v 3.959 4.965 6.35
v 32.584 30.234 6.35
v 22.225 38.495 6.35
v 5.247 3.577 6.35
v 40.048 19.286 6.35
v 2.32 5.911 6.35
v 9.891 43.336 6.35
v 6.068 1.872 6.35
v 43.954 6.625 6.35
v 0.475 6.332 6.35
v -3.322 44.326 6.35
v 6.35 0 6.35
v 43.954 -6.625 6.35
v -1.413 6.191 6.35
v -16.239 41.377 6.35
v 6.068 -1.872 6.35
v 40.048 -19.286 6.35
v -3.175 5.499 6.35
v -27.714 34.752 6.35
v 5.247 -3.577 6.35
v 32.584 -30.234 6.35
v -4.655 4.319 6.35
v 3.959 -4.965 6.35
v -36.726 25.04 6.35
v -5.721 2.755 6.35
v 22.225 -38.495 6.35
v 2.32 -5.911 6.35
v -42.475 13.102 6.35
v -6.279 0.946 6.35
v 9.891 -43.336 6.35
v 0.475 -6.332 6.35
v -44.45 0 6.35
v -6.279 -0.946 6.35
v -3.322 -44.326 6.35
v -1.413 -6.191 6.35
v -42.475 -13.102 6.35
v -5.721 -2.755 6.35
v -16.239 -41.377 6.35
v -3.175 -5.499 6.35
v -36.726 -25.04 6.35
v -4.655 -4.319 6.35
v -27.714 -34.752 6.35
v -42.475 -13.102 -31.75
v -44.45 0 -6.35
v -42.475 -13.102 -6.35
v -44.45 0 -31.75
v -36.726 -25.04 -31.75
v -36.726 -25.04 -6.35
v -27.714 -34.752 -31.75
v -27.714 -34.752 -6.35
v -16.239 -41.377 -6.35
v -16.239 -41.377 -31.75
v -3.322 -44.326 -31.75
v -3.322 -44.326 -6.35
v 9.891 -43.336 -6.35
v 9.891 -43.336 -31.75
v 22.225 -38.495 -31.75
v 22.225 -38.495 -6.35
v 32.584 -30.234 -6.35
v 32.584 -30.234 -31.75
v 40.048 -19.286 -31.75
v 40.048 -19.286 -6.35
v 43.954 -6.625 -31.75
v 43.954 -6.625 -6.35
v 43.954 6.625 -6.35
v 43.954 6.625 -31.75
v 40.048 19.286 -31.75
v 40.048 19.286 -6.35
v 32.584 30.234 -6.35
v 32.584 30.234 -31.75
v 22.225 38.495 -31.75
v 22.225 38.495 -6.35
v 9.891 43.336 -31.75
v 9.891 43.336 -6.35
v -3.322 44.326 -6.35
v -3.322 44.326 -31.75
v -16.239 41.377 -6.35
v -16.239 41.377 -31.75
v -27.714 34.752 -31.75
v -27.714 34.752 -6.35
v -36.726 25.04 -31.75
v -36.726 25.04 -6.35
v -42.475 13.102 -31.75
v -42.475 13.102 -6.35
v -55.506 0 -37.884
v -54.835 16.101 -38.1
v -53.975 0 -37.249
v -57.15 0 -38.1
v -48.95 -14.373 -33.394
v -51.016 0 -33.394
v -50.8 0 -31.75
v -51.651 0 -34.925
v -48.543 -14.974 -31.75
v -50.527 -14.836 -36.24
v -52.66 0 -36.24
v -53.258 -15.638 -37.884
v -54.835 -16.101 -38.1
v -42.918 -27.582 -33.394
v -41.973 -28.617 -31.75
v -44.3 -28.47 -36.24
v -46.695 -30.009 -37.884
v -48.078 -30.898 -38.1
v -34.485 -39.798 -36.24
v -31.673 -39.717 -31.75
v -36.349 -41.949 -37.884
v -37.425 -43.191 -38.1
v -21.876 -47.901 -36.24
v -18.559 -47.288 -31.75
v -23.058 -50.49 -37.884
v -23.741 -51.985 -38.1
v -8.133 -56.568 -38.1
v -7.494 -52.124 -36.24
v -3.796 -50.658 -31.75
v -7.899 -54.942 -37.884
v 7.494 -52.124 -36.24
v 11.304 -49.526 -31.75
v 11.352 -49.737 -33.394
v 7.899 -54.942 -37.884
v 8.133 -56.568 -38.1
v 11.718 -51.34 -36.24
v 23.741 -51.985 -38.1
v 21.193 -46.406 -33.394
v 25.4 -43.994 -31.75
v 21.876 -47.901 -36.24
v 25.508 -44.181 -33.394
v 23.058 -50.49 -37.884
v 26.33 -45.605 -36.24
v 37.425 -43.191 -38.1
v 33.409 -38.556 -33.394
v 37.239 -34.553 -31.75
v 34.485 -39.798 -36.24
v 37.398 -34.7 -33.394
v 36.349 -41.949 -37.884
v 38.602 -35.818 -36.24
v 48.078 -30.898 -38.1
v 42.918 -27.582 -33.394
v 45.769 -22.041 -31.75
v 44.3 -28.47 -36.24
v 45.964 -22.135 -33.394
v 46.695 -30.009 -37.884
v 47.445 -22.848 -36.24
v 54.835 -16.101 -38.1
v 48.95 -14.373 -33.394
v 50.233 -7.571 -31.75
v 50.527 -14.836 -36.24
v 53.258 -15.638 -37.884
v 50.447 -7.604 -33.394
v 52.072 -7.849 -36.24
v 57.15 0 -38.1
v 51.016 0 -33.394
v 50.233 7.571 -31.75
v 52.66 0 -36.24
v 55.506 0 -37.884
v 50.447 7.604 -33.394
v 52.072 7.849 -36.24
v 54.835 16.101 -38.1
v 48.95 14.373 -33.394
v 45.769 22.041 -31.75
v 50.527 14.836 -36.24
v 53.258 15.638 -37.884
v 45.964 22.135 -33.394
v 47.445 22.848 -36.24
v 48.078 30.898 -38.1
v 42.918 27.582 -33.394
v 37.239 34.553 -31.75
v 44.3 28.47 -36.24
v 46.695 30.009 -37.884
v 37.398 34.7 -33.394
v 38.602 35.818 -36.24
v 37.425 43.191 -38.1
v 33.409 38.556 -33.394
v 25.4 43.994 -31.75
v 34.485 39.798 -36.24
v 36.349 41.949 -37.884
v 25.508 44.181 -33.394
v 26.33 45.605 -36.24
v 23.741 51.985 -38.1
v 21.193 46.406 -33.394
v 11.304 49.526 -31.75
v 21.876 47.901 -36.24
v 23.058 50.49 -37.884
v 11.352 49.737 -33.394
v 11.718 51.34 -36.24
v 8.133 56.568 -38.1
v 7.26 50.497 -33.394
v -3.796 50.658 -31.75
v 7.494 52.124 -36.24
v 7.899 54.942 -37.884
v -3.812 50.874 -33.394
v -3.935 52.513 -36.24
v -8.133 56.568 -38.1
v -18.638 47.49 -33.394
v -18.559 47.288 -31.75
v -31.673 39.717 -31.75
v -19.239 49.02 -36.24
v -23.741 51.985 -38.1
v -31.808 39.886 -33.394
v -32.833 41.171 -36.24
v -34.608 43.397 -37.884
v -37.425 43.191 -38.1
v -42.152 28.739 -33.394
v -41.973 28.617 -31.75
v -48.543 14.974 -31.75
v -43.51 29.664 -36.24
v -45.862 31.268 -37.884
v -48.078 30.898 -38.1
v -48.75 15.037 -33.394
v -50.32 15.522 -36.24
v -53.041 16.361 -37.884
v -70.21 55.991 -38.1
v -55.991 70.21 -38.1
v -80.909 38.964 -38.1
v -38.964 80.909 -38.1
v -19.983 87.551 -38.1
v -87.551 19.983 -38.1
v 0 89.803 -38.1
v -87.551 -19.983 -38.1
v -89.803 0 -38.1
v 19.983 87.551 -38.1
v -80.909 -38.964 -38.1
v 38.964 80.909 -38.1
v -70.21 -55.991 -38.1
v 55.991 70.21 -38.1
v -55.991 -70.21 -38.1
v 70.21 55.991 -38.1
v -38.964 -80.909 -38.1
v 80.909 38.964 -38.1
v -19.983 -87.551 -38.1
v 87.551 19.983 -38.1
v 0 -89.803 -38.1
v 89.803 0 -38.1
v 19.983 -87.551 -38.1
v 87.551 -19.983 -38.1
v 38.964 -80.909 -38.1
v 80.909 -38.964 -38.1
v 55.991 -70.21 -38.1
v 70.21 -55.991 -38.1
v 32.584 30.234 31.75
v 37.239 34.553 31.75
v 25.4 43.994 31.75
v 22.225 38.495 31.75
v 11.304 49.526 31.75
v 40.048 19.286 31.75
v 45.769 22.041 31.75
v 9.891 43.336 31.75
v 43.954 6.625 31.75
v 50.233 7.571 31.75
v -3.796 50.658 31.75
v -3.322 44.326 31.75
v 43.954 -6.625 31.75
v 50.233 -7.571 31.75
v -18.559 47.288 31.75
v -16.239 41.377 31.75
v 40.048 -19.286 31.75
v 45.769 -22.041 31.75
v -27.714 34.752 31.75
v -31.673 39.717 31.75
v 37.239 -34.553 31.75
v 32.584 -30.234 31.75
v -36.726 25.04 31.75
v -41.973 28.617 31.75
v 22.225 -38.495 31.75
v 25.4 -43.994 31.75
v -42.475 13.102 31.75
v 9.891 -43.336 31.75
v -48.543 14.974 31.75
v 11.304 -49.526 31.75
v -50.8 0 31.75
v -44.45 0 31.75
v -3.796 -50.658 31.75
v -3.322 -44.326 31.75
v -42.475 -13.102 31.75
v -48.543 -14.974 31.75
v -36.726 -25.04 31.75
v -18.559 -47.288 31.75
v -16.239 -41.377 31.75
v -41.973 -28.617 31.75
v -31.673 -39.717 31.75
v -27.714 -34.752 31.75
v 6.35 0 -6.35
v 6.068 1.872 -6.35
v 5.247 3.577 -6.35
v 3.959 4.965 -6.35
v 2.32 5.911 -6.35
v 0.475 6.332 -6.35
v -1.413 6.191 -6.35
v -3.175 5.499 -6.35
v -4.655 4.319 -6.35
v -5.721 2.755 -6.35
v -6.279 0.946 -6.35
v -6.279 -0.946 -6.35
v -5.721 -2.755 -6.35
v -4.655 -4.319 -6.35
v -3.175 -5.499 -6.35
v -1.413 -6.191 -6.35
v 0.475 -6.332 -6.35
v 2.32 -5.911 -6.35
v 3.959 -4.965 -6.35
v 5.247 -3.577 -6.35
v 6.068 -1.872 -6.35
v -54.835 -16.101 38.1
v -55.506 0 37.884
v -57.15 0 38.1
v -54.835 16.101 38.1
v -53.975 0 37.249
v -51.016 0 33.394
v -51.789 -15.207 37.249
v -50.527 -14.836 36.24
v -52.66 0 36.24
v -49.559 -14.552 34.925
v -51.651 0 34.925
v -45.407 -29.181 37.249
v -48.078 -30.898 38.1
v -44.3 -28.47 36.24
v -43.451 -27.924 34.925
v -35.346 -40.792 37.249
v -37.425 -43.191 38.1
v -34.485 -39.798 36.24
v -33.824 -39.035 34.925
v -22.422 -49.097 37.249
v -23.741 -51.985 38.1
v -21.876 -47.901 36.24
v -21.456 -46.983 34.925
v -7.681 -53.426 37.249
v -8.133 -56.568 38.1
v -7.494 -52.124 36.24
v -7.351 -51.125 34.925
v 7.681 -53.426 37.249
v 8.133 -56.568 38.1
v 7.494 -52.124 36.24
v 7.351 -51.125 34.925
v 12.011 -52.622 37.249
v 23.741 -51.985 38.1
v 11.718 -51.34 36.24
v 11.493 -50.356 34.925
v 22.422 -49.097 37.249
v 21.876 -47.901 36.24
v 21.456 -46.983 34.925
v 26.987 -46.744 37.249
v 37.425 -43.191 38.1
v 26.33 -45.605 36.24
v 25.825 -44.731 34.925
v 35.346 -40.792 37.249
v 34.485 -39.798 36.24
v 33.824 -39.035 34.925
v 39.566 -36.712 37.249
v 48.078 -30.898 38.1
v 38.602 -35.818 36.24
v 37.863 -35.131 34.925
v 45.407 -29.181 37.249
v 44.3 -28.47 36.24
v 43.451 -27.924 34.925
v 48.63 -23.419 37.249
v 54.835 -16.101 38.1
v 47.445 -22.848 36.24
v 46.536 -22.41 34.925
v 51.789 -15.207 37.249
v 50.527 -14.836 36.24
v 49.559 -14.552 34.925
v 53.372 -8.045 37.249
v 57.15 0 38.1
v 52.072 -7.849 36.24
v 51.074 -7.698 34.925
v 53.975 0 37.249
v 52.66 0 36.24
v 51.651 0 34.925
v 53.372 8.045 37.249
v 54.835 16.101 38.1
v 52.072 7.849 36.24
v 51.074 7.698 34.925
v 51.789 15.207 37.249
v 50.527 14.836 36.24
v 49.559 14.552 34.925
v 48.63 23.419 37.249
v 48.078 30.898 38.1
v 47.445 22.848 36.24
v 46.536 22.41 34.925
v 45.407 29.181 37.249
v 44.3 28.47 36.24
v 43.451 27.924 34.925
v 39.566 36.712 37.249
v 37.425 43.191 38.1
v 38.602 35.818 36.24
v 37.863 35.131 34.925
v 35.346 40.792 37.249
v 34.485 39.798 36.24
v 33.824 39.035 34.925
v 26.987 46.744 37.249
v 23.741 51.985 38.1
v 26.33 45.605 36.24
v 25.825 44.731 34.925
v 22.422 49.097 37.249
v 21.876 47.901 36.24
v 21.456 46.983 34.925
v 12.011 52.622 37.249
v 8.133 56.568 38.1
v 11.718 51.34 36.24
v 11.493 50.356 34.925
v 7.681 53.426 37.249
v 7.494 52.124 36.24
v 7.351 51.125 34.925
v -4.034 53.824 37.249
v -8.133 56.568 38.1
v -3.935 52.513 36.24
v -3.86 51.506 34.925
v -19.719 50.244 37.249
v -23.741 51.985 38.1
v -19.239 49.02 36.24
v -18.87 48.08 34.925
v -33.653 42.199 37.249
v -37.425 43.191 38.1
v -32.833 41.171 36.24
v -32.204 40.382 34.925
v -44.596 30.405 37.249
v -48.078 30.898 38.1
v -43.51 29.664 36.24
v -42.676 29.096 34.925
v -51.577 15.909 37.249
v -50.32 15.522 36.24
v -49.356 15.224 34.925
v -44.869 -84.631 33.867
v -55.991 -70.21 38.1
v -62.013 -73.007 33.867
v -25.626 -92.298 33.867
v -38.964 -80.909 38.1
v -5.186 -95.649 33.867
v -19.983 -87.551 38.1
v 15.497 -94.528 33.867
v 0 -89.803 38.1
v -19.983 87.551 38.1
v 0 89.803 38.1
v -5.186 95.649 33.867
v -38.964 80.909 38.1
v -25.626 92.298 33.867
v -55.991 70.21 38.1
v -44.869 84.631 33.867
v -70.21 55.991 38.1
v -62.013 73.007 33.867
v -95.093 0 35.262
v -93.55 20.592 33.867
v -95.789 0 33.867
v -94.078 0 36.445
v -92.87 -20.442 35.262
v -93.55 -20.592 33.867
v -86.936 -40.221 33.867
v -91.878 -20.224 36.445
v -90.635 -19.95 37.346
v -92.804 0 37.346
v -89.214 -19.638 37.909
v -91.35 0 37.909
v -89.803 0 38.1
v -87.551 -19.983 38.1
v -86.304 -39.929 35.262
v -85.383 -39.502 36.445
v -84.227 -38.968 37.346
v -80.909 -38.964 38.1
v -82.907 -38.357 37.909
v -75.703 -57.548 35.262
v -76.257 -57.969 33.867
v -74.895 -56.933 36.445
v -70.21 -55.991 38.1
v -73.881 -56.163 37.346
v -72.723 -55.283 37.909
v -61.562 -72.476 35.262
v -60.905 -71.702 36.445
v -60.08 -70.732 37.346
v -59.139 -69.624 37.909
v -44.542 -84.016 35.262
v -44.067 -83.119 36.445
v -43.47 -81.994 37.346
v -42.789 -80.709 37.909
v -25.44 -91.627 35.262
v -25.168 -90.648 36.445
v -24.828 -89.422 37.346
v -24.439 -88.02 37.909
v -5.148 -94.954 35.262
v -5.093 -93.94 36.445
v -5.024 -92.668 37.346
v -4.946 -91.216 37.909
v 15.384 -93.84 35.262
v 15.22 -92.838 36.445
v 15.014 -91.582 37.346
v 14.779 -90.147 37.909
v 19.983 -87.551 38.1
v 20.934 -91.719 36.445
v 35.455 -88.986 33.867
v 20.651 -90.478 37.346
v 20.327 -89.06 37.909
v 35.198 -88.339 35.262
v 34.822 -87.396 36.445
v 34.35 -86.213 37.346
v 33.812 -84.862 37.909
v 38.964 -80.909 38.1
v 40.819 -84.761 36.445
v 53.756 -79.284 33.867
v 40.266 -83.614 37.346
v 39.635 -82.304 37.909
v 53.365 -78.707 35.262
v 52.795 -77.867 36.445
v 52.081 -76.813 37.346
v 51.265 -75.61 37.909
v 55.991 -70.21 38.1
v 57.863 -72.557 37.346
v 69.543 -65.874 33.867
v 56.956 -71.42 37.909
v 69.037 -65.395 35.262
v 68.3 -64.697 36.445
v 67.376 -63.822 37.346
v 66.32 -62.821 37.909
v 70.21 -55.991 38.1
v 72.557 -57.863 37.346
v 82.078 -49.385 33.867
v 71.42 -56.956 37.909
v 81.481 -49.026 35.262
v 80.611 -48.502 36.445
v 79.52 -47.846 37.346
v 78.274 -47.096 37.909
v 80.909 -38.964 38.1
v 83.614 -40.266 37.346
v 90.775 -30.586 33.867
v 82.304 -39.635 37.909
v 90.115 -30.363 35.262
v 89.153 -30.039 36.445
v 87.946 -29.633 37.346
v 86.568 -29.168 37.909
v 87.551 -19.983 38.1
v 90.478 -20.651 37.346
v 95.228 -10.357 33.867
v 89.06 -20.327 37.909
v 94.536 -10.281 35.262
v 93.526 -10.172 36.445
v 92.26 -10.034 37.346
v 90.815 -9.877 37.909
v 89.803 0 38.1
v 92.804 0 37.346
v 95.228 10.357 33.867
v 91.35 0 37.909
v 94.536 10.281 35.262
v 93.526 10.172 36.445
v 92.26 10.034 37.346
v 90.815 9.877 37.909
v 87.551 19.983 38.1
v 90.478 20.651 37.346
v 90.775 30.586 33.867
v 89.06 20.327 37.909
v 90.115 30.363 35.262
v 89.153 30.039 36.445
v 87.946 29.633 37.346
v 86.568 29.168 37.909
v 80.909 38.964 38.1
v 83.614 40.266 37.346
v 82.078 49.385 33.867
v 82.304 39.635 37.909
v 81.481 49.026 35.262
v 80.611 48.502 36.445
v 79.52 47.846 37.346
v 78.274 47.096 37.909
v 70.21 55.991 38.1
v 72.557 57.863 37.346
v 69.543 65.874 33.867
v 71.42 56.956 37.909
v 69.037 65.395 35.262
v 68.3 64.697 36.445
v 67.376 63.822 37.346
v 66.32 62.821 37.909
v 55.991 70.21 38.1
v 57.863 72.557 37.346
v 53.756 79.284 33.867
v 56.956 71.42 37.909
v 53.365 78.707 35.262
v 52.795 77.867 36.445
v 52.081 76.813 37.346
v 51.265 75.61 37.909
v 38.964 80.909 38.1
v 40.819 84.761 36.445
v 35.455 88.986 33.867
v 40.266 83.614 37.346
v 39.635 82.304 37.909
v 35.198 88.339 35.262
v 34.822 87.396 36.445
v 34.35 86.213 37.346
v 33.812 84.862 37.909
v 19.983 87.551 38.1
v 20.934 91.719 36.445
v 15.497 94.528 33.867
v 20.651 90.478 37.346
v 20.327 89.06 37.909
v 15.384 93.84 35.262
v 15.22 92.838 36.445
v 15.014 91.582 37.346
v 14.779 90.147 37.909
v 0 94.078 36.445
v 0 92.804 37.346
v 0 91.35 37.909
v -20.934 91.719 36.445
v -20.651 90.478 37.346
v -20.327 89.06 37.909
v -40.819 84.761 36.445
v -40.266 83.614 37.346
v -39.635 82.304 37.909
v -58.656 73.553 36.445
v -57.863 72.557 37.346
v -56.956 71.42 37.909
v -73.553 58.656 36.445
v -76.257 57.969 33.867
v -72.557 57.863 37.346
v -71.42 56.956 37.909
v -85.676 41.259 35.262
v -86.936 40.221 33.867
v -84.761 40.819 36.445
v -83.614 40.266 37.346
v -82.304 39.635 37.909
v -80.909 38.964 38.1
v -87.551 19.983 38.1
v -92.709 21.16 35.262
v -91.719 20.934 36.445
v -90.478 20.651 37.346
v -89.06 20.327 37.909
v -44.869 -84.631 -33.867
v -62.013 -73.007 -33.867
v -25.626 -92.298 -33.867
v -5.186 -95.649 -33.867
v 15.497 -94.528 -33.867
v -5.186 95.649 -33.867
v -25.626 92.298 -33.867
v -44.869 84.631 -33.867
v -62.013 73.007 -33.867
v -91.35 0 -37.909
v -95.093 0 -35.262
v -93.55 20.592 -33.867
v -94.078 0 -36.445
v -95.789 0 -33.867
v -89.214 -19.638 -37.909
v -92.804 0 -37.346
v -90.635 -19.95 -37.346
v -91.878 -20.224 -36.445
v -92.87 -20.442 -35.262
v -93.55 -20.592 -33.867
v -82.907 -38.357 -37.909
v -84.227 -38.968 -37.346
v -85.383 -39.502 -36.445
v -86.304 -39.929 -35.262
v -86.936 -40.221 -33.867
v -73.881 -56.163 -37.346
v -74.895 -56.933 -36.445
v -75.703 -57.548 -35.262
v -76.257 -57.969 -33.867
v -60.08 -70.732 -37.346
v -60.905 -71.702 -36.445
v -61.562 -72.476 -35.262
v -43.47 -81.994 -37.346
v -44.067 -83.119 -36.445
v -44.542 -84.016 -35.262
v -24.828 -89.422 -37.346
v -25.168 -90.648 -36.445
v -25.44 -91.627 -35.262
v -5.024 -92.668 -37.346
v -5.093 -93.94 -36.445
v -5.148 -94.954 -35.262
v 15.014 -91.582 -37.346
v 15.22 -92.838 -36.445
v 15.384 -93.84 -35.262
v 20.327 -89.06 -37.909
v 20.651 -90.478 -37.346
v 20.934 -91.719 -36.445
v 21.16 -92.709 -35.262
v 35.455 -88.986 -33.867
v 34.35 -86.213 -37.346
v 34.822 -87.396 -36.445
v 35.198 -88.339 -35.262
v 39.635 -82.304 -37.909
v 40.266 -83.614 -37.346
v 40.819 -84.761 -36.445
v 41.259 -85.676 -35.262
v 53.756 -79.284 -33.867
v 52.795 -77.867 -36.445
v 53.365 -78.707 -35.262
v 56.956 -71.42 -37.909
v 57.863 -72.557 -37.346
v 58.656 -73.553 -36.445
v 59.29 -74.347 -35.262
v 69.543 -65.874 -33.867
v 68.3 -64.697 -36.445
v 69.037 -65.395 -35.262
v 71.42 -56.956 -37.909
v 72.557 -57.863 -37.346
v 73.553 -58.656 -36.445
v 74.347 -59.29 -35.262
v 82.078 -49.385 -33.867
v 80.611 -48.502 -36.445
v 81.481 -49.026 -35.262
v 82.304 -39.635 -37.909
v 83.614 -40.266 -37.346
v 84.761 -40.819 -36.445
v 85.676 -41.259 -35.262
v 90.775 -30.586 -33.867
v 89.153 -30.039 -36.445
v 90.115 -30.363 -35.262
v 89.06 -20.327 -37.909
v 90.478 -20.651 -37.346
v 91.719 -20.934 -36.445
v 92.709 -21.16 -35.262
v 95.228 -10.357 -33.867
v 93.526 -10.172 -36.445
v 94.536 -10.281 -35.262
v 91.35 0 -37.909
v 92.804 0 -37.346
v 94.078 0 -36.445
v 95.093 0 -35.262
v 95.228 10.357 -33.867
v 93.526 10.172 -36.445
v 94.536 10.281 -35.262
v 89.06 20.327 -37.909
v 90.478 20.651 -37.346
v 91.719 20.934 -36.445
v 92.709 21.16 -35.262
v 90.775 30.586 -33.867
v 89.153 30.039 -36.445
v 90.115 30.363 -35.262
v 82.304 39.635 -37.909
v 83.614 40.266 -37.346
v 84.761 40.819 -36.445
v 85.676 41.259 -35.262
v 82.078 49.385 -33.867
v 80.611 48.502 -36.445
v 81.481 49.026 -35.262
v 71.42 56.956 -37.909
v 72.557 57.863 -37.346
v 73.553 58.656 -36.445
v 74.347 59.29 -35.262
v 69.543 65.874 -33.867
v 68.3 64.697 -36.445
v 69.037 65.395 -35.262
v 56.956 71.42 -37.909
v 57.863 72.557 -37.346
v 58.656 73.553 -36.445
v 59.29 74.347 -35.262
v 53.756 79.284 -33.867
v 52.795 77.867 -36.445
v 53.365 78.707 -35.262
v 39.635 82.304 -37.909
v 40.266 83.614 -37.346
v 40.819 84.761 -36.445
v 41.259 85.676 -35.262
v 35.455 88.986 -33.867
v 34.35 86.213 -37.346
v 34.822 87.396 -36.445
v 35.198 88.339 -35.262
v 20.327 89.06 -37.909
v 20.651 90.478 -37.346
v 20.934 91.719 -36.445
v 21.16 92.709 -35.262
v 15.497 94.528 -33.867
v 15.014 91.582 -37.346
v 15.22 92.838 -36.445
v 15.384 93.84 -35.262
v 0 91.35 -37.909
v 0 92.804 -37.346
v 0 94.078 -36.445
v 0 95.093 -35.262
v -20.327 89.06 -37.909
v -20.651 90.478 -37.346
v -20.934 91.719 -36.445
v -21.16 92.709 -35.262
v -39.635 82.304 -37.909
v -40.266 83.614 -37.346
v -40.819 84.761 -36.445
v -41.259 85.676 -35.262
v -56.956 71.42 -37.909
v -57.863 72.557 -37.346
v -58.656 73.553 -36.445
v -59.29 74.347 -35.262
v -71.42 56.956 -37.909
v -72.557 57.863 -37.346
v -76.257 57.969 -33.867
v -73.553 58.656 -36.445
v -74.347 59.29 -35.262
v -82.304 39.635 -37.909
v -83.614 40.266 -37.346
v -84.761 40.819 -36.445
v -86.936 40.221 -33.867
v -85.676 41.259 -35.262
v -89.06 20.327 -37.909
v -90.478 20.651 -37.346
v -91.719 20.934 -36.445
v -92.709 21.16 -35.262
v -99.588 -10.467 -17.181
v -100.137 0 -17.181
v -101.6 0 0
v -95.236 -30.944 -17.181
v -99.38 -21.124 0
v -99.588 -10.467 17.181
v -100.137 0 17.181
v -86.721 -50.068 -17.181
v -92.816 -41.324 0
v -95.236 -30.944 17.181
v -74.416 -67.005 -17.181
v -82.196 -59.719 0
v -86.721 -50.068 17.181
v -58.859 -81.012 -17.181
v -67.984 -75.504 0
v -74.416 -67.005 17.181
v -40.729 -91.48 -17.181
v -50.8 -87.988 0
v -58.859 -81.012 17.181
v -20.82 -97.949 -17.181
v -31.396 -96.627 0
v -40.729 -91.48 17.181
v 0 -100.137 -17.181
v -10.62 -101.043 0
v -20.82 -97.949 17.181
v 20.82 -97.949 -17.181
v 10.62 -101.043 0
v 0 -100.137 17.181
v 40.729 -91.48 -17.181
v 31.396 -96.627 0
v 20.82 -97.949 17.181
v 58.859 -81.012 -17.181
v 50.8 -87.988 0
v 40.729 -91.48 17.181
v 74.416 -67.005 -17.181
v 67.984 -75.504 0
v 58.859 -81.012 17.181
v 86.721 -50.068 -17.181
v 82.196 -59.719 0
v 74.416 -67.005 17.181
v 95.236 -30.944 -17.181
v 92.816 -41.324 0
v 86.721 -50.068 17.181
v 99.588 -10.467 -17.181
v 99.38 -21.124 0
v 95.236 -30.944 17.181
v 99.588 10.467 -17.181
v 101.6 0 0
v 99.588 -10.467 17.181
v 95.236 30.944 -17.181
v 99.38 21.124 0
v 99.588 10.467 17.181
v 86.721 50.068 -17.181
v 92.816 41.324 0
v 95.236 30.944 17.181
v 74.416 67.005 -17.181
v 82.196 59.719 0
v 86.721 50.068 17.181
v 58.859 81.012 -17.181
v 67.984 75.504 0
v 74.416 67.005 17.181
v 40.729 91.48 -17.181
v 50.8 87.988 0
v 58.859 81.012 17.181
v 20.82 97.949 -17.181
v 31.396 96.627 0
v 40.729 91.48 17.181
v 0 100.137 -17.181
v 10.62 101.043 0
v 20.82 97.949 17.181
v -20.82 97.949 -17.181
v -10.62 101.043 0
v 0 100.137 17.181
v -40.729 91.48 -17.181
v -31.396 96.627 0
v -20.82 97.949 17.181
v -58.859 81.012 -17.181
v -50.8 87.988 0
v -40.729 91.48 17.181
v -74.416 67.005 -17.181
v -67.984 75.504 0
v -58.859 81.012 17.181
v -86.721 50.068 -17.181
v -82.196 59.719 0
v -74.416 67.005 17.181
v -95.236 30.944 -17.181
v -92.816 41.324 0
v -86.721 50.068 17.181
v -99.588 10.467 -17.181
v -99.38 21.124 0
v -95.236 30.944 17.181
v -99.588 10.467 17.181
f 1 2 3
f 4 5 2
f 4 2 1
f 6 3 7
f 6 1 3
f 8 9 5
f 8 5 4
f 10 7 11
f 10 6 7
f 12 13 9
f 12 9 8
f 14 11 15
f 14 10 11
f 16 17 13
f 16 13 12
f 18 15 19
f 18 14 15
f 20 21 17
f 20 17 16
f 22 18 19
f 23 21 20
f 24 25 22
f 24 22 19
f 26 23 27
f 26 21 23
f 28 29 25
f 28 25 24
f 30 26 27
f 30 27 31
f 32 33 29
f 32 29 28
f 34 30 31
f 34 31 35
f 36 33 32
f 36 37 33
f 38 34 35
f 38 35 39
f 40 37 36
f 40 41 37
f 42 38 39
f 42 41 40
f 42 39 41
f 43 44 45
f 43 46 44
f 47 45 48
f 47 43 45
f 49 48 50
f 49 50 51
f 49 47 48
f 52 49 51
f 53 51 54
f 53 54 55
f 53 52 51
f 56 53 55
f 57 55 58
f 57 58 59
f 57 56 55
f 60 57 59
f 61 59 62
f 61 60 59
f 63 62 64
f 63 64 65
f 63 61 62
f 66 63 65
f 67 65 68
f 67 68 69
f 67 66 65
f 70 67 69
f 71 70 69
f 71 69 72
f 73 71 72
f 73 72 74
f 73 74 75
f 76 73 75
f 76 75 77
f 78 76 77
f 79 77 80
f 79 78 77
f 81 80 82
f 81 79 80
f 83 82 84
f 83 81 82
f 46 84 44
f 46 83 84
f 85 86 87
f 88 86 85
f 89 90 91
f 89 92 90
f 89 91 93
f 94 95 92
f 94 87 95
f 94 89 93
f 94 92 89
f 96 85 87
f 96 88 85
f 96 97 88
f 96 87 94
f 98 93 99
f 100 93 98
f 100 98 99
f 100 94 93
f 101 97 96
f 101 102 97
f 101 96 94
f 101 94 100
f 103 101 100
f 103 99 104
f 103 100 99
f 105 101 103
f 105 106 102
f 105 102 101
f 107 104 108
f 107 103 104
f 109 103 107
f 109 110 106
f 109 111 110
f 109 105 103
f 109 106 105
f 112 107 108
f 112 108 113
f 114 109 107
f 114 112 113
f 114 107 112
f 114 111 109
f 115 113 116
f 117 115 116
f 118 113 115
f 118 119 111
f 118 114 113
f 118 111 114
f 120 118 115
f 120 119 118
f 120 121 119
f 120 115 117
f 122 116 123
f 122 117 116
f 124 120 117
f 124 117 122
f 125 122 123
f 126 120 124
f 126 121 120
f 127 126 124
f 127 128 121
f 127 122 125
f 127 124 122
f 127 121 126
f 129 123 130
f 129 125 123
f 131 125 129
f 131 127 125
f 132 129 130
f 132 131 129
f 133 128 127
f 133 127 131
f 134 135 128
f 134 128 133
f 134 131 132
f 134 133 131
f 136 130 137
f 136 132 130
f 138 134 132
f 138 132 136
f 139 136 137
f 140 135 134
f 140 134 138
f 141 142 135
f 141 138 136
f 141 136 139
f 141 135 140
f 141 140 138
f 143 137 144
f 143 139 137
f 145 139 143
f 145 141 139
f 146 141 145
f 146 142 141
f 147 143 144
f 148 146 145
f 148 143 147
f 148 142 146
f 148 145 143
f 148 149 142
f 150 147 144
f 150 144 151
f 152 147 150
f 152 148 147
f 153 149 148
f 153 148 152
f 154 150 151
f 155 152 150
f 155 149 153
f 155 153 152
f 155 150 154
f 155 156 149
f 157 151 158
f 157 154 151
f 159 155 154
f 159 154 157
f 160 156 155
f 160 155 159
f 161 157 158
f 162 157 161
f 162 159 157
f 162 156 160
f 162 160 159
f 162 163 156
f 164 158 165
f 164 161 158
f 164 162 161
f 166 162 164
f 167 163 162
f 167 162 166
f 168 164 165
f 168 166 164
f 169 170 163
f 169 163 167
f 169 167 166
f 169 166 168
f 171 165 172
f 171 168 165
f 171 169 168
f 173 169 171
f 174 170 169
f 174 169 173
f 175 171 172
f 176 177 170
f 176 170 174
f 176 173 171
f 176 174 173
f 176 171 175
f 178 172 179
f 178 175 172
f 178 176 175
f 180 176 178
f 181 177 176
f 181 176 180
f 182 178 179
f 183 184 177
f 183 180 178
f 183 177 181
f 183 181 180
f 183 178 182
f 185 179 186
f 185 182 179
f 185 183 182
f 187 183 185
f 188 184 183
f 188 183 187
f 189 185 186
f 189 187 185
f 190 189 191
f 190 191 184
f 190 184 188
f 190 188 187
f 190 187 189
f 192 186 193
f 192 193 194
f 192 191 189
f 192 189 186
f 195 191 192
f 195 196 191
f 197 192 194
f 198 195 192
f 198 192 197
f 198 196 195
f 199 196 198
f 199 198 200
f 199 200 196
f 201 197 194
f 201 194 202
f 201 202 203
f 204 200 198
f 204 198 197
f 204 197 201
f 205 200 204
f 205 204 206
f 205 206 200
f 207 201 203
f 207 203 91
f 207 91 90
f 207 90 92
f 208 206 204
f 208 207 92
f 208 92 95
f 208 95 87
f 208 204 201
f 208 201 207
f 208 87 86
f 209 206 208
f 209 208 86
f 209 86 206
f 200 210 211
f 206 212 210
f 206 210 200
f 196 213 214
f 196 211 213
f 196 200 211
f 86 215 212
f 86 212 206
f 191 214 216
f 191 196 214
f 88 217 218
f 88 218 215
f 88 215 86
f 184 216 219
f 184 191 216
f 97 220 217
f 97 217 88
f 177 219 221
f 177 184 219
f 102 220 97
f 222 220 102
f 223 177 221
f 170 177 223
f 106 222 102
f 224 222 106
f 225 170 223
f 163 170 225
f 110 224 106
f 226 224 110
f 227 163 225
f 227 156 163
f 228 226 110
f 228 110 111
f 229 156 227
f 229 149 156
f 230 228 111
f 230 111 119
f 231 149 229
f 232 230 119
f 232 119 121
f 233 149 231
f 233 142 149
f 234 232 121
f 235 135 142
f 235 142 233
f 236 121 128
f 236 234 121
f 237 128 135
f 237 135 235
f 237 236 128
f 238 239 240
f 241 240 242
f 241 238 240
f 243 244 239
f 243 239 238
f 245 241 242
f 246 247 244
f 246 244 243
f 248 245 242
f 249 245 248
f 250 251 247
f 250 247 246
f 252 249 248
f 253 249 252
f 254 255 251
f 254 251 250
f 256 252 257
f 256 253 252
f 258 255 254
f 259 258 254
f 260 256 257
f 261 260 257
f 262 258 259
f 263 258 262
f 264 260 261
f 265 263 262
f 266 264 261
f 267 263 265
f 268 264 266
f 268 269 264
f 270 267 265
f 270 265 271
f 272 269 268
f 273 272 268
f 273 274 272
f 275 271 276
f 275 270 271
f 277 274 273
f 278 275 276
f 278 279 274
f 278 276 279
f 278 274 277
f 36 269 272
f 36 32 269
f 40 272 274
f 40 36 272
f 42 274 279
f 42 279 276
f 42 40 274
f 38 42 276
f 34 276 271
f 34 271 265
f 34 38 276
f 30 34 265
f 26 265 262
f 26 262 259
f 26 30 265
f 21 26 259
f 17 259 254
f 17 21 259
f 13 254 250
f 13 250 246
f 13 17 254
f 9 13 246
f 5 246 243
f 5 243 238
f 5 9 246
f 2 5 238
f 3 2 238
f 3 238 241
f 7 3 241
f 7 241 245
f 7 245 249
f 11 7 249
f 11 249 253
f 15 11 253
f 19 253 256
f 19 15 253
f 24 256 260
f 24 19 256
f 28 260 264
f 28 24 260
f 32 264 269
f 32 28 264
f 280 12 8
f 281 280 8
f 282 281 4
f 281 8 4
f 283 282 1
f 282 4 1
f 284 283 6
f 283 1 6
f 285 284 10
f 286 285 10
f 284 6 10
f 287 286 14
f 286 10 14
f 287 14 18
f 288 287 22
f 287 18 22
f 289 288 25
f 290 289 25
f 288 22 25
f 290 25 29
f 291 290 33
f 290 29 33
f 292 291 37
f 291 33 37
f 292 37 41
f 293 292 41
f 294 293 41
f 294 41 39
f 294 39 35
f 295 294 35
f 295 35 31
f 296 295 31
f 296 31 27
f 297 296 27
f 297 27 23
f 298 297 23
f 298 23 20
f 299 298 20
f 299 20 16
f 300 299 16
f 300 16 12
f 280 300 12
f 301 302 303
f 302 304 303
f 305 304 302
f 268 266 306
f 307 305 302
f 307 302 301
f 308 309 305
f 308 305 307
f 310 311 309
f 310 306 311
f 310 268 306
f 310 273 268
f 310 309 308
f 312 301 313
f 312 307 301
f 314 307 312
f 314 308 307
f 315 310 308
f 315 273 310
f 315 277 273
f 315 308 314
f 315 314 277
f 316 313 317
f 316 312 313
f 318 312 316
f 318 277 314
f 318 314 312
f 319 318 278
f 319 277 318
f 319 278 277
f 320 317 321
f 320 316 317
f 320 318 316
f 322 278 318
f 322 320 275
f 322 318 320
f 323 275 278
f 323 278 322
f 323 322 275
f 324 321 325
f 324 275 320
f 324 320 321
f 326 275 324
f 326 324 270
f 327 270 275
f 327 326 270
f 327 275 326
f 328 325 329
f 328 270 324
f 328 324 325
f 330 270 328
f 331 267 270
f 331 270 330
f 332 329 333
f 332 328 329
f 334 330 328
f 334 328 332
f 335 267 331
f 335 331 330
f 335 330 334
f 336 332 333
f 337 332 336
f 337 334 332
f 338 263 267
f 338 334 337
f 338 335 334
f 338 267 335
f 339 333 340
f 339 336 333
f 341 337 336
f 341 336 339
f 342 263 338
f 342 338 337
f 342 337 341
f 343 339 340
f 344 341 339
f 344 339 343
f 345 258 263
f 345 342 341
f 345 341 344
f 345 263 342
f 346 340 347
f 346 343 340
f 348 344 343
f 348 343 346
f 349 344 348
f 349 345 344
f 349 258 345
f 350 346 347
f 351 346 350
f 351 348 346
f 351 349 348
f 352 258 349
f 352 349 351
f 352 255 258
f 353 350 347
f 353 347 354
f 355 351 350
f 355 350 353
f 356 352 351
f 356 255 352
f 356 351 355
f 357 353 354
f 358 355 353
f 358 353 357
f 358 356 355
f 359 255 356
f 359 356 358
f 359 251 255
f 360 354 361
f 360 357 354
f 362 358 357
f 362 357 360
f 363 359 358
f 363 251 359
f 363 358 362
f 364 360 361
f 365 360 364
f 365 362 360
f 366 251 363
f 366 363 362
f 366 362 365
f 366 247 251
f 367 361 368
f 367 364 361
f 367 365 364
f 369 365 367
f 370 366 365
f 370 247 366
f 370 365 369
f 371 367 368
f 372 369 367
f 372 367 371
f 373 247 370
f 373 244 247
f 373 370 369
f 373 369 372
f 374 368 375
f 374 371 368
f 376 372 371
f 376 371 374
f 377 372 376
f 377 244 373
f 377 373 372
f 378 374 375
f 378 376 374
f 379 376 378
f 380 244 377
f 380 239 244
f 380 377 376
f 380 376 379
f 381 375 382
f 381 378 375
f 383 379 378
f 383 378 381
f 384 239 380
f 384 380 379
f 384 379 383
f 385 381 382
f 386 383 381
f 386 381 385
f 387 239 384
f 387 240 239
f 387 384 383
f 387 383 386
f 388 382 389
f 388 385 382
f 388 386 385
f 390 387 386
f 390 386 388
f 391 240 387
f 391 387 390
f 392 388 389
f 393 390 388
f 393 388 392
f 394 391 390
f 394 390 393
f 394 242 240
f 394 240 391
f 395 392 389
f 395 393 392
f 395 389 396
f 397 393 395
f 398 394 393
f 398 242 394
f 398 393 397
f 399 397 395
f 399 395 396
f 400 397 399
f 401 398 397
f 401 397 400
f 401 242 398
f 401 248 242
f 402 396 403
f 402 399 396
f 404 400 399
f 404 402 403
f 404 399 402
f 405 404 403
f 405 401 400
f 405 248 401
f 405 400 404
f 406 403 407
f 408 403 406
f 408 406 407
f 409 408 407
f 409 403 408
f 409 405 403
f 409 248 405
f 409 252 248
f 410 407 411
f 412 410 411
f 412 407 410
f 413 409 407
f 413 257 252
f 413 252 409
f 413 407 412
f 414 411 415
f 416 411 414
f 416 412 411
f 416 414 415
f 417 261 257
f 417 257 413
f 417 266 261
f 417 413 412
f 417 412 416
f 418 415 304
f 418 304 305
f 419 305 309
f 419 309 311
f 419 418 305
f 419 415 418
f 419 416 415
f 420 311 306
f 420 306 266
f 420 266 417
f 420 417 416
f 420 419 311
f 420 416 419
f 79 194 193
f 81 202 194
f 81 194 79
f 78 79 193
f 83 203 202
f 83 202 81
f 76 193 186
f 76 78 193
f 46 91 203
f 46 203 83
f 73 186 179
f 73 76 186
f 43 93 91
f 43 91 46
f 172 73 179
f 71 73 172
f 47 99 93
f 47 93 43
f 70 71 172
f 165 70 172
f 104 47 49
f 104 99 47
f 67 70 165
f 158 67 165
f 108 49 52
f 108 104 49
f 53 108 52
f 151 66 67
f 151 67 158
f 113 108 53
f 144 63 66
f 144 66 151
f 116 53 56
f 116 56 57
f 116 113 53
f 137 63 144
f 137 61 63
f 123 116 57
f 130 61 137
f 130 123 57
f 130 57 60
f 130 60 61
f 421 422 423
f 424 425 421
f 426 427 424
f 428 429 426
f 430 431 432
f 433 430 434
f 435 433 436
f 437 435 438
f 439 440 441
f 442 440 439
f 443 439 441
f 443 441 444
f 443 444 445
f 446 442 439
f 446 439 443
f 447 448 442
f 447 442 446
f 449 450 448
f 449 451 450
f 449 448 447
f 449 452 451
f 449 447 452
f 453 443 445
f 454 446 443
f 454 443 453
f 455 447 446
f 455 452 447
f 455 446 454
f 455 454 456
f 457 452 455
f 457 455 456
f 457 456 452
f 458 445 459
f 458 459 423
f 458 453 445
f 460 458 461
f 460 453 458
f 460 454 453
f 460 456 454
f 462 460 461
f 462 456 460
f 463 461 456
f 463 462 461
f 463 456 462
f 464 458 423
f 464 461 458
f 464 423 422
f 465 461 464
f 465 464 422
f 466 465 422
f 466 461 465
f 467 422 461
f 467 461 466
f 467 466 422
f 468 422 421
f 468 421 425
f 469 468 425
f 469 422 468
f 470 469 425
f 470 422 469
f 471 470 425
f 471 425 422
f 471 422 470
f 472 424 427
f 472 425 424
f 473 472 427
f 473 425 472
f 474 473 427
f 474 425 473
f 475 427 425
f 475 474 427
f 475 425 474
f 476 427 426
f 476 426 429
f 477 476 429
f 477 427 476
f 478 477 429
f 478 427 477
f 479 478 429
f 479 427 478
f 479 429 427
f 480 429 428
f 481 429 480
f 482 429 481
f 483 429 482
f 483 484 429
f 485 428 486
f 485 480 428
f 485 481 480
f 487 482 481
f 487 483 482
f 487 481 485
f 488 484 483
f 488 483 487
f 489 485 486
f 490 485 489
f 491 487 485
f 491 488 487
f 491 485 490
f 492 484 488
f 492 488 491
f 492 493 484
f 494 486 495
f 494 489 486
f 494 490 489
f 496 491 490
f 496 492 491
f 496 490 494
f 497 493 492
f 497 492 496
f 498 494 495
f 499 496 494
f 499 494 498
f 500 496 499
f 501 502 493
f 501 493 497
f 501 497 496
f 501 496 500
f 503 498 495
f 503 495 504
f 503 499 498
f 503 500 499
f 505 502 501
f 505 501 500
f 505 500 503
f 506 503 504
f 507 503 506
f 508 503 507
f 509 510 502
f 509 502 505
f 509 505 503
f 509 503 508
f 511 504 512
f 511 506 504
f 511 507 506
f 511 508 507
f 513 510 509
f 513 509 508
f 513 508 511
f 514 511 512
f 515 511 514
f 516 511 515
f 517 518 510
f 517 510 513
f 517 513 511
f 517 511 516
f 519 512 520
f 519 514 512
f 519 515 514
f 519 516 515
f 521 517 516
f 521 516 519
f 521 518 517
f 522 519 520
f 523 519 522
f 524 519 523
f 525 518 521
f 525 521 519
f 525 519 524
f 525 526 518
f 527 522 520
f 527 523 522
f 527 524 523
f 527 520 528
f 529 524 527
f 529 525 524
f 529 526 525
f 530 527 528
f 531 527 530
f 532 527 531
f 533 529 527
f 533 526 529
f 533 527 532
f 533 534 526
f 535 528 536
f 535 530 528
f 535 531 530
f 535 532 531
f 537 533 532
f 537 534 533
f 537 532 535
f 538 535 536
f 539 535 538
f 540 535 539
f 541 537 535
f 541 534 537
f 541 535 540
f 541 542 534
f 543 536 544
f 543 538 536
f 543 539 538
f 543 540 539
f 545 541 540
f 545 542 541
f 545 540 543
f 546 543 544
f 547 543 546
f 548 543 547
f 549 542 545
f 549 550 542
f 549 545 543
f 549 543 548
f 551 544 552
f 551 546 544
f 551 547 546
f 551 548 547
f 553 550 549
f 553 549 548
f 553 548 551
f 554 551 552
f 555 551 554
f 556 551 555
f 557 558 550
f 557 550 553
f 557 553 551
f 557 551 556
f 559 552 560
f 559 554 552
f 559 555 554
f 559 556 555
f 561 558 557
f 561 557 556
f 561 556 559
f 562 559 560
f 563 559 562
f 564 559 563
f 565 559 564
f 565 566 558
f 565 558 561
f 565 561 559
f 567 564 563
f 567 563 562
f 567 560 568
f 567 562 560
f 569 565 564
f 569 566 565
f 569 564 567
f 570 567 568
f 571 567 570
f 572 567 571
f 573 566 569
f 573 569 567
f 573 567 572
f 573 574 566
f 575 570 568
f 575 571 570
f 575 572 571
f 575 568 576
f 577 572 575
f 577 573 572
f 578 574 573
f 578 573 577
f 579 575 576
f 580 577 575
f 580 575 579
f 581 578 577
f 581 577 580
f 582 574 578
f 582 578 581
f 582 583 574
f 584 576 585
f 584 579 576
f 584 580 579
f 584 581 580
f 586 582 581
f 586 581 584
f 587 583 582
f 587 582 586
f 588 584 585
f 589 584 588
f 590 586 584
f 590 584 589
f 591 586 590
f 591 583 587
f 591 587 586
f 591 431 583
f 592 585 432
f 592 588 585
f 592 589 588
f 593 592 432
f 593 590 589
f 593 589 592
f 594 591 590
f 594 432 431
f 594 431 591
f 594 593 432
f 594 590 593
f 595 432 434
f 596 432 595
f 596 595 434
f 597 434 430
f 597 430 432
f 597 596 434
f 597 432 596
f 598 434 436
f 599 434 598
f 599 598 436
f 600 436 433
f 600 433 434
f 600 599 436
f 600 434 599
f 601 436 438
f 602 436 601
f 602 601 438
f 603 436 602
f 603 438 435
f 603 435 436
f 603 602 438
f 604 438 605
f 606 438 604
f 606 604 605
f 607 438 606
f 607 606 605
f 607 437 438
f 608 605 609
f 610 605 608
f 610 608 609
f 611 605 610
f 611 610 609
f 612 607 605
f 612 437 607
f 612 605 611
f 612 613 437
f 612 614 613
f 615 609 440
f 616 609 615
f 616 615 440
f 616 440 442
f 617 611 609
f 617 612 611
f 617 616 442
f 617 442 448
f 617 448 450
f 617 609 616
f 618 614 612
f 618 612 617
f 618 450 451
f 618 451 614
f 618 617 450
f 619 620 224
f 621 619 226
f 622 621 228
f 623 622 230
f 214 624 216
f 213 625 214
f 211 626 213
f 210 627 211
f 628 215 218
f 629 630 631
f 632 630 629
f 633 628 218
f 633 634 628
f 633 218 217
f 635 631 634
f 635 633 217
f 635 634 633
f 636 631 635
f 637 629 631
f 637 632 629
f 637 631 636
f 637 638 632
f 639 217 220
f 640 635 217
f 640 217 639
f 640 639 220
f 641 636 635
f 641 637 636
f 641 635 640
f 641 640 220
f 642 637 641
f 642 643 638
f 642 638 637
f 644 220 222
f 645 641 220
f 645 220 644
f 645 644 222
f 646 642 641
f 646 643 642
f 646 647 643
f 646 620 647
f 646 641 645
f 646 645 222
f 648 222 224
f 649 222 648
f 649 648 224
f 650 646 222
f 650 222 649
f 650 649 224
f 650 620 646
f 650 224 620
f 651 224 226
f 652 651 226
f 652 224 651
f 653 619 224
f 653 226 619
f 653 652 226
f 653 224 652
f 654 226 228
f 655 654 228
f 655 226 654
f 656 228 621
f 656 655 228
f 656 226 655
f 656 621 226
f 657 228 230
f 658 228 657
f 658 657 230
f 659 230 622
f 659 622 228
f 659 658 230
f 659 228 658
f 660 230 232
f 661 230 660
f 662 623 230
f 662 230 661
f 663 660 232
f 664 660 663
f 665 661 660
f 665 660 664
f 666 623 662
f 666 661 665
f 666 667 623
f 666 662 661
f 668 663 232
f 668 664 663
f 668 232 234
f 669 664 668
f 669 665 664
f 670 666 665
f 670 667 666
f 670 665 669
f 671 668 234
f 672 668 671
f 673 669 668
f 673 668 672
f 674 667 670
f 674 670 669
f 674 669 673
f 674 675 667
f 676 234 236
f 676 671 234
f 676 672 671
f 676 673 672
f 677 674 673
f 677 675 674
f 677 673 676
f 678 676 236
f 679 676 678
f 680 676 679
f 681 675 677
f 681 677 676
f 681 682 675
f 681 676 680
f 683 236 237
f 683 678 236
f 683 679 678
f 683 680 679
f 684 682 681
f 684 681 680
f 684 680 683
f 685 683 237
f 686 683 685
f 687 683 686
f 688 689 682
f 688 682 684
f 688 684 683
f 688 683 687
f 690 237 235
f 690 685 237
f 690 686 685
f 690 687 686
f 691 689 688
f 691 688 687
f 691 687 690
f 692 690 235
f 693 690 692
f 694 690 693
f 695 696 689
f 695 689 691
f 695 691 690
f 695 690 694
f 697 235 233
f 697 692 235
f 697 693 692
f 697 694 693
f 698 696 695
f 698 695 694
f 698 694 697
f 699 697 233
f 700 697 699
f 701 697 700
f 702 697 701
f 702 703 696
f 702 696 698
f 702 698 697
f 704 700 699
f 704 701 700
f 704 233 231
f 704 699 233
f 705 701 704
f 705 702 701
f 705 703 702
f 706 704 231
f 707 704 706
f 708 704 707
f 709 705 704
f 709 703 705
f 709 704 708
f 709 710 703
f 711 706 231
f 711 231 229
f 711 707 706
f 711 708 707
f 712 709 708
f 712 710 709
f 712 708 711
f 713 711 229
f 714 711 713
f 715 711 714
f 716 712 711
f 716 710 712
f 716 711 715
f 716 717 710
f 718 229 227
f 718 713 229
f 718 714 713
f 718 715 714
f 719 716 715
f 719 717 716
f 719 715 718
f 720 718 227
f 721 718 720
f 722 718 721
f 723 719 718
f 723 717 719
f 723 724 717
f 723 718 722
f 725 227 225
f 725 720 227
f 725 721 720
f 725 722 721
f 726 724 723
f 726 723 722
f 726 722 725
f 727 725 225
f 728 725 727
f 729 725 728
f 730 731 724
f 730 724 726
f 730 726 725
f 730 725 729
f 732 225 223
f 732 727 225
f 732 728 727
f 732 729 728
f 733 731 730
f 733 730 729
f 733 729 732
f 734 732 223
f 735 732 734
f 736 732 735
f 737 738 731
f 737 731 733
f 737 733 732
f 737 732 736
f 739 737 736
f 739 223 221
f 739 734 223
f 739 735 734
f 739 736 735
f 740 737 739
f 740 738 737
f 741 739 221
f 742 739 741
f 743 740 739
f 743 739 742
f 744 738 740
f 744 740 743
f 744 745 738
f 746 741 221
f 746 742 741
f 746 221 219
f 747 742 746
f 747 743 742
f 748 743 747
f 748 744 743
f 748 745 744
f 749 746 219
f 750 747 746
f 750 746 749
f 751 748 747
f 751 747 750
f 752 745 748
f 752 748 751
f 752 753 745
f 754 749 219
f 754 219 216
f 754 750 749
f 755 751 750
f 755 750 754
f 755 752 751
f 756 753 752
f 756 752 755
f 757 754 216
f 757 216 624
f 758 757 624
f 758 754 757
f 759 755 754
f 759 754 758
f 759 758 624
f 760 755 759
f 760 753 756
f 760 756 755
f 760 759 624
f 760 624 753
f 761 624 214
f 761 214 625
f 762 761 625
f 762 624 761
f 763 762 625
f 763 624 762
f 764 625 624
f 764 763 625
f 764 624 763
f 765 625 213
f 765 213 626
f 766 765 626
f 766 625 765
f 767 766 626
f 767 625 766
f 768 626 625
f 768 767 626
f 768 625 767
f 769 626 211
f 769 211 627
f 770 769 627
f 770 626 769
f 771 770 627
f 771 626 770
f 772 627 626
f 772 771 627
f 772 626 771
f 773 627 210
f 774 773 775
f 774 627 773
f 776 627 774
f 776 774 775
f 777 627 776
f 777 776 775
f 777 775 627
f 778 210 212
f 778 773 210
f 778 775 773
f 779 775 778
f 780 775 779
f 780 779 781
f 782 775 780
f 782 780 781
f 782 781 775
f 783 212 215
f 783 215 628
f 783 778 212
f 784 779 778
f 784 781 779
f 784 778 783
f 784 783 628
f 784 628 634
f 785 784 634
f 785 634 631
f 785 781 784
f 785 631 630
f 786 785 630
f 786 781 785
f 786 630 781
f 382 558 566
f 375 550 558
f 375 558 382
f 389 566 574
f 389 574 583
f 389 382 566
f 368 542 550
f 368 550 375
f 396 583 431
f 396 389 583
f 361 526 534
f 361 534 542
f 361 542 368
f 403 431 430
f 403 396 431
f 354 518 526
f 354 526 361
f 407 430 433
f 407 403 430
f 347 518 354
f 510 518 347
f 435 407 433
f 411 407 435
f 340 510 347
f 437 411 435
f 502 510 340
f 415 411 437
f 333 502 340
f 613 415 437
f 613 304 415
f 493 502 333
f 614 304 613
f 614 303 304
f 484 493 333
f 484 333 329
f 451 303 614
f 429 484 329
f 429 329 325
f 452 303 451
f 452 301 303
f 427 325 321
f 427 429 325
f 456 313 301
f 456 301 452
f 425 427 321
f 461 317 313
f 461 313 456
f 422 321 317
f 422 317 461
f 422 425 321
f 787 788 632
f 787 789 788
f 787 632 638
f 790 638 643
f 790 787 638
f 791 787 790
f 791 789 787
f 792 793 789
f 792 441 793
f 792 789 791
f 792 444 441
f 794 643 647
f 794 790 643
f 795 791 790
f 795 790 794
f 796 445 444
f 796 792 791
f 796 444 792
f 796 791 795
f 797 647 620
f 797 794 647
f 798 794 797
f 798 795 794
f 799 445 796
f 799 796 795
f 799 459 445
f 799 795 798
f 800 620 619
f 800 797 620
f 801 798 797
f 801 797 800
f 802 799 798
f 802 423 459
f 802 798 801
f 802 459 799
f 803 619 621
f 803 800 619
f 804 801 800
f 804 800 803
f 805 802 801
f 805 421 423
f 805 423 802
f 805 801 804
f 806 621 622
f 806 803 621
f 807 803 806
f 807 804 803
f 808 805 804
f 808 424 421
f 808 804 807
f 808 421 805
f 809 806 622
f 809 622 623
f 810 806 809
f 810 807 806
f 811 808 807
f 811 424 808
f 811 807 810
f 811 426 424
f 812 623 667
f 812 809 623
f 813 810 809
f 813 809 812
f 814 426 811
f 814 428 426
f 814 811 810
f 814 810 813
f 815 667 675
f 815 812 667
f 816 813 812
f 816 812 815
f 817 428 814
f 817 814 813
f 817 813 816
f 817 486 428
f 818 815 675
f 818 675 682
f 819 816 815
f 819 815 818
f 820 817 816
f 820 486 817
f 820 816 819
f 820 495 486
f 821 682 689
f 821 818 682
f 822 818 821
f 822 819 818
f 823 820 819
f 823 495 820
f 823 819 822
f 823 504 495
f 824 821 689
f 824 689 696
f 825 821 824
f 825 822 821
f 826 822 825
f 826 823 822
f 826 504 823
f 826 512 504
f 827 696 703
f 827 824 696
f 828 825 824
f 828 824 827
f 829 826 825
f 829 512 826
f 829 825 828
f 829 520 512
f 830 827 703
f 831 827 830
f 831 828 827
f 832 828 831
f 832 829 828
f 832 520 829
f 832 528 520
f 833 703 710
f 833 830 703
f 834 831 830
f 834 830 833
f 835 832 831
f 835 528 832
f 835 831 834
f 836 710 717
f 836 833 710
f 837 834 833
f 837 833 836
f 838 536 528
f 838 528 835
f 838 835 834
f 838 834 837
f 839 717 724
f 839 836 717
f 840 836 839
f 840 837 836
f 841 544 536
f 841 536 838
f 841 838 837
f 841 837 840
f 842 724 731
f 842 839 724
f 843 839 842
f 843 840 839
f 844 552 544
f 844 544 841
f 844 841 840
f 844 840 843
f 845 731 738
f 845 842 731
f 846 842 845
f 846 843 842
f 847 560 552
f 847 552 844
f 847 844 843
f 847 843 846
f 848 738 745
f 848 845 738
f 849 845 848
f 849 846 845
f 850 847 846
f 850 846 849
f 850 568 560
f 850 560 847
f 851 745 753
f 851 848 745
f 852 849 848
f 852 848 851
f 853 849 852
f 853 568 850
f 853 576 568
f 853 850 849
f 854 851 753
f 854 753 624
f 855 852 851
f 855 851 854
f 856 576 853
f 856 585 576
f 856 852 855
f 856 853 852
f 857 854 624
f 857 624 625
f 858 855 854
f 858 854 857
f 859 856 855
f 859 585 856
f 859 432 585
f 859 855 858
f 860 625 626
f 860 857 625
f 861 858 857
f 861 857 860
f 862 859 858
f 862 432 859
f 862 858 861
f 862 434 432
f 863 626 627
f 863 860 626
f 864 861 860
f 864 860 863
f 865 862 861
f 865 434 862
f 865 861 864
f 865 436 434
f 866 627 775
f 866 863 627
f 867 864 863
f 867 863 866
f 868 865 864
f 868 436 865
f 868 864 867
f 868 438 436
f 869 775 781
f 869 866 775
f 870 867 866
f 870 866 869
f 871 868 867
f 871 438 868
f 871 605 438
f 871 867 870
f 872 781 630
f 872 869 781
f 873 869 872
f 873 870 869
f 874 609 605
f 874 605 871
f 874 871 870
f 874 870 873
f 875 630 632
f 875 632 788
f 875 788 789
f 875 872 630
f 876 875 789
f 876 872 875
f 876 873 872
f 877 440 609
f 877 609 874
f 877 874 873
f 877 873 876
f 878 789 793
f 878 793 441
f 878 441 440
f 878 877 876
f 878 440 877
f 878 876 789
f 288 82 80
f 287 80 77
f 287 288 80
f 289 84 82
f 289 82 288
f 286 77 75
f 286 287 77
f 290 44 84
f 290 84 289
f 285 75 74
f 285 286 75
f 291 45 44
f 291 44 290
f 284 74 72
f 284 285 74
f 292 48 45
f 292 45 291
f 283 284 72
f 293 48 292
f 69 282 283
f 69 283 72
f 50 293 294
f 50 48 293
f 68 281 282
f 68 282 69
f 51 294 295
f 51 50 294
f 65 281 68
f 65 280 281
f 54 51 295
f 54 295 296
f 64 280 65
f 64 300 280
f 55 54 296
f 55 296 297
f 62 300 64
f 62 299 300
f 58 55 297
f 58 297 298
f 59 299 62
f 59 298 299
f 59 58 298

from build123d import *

# Parameters (mm, degrees)
SKETCH3_R               = 6.35
CUT_EXTRUDE1_DEPTH      = 32.75
CUT_EXTRUDE1_DEPTH_BACK = 45.45


with BuildPart() as part:
    # Sketch1 → Revolve1 (revolve)
    with BuildSketch(Plane(origin=(0, 0, 0), x_dir=(1, 0, 0), z_dir=(0, 1, 0))):
        with BuildLine():
            Line((-89.802561211, -38.1), (-57.15, -38.1))
            ThreePointArc((-57.15, -38.1), (-52.659871939, -36.240128061), (-50.8, -31.75))
            Line((-50.8, -31.75), (-50.8, 31.75))
            ThreePointArc((-50.8, 31.75), (-52.659871939, 36.240128061), (-57.15, 38.1))
            Line((-57.15, 38.1), (-89.802561211, 38.1))
            ThreePointArc((-89.802561211, 38.1), (-93.46873542, 36.934753289), (-95.789398625, 33.866666667))
            ThreePointArc((-95.789398625, 33.866666667), (-101.6, 0), (-95.789398625, -33.866666667))
            ThreePointArc((-95.789398625, -33.866666667), (-93.46873542, -36.934753289), (-89.802561211, -38.1))
        make_face()
    revolve(axis=Axis((0, 0, 0), (0, 0, 1)))

    # Sketch2 → Revolve2 (revolve)
    with BuildSketch(Plane(origin=(0, 0, 0), x_dir=(1, 0, 0), z_dir=(0, 1, 0))):
        Polygon((-44.45, 31.75), (-50.8, 31.75), (-50.8, -31.75), (-44.45, -31.75), (-44.45, -6.35), (0, -6.35), (0, 6.35), (-44.45, 6.35), align=None)
        with BuildLine():
            Line((-50.8, -31.75), (-50.8, 31.75))
            ThreePointArc((-50.8, 31.75), (-52.659871939, 36.240128061), (-57.15, 38.1))
            Line((-57.15, 38.1), (-89.802561211, 38.1))
            ThreePointArc((-89.802561211, 38.1), (-93.46873542, 36.934753289), (-95.789398625, 33.866666667))
            ThreePointArc((-95.789398625, 33.866666667), (-101.6, 0), (-95.789398625, -33.866666667))
            ThreePointArc((-95.789398625, -33.866666667), (-93.46873542, -36.934753289), (-89.802561211, -38.1))
            Line((-89.802561211, -38.1), (-57.15, -38.1))
            ThreePointArc((-57.15, -38.1), (-52.659871939, -36.240128061), (-50.8, -31.75))
        make_face()
    revolve(axis=Axis((0, 0, 0), (0, 0, 1)))

    # Sketch3 → Cut-Extrude1 (cut, two sides)
    with BuildSketch(Plane.XY.offset(6.35)) as cut_extrude1_sk:
        Circle(SKETCH3_R)
    extrude(amount=CUT_EXTRUDE1_DEPTH, mode=Mode.SUBTRACT)
    extrude(cut_extrude1_sk.sketch, amount=-CUT_EXTRUDE1_DEPTH_BACK, mode=Mode.SUBTRACT)


solid = part.part
